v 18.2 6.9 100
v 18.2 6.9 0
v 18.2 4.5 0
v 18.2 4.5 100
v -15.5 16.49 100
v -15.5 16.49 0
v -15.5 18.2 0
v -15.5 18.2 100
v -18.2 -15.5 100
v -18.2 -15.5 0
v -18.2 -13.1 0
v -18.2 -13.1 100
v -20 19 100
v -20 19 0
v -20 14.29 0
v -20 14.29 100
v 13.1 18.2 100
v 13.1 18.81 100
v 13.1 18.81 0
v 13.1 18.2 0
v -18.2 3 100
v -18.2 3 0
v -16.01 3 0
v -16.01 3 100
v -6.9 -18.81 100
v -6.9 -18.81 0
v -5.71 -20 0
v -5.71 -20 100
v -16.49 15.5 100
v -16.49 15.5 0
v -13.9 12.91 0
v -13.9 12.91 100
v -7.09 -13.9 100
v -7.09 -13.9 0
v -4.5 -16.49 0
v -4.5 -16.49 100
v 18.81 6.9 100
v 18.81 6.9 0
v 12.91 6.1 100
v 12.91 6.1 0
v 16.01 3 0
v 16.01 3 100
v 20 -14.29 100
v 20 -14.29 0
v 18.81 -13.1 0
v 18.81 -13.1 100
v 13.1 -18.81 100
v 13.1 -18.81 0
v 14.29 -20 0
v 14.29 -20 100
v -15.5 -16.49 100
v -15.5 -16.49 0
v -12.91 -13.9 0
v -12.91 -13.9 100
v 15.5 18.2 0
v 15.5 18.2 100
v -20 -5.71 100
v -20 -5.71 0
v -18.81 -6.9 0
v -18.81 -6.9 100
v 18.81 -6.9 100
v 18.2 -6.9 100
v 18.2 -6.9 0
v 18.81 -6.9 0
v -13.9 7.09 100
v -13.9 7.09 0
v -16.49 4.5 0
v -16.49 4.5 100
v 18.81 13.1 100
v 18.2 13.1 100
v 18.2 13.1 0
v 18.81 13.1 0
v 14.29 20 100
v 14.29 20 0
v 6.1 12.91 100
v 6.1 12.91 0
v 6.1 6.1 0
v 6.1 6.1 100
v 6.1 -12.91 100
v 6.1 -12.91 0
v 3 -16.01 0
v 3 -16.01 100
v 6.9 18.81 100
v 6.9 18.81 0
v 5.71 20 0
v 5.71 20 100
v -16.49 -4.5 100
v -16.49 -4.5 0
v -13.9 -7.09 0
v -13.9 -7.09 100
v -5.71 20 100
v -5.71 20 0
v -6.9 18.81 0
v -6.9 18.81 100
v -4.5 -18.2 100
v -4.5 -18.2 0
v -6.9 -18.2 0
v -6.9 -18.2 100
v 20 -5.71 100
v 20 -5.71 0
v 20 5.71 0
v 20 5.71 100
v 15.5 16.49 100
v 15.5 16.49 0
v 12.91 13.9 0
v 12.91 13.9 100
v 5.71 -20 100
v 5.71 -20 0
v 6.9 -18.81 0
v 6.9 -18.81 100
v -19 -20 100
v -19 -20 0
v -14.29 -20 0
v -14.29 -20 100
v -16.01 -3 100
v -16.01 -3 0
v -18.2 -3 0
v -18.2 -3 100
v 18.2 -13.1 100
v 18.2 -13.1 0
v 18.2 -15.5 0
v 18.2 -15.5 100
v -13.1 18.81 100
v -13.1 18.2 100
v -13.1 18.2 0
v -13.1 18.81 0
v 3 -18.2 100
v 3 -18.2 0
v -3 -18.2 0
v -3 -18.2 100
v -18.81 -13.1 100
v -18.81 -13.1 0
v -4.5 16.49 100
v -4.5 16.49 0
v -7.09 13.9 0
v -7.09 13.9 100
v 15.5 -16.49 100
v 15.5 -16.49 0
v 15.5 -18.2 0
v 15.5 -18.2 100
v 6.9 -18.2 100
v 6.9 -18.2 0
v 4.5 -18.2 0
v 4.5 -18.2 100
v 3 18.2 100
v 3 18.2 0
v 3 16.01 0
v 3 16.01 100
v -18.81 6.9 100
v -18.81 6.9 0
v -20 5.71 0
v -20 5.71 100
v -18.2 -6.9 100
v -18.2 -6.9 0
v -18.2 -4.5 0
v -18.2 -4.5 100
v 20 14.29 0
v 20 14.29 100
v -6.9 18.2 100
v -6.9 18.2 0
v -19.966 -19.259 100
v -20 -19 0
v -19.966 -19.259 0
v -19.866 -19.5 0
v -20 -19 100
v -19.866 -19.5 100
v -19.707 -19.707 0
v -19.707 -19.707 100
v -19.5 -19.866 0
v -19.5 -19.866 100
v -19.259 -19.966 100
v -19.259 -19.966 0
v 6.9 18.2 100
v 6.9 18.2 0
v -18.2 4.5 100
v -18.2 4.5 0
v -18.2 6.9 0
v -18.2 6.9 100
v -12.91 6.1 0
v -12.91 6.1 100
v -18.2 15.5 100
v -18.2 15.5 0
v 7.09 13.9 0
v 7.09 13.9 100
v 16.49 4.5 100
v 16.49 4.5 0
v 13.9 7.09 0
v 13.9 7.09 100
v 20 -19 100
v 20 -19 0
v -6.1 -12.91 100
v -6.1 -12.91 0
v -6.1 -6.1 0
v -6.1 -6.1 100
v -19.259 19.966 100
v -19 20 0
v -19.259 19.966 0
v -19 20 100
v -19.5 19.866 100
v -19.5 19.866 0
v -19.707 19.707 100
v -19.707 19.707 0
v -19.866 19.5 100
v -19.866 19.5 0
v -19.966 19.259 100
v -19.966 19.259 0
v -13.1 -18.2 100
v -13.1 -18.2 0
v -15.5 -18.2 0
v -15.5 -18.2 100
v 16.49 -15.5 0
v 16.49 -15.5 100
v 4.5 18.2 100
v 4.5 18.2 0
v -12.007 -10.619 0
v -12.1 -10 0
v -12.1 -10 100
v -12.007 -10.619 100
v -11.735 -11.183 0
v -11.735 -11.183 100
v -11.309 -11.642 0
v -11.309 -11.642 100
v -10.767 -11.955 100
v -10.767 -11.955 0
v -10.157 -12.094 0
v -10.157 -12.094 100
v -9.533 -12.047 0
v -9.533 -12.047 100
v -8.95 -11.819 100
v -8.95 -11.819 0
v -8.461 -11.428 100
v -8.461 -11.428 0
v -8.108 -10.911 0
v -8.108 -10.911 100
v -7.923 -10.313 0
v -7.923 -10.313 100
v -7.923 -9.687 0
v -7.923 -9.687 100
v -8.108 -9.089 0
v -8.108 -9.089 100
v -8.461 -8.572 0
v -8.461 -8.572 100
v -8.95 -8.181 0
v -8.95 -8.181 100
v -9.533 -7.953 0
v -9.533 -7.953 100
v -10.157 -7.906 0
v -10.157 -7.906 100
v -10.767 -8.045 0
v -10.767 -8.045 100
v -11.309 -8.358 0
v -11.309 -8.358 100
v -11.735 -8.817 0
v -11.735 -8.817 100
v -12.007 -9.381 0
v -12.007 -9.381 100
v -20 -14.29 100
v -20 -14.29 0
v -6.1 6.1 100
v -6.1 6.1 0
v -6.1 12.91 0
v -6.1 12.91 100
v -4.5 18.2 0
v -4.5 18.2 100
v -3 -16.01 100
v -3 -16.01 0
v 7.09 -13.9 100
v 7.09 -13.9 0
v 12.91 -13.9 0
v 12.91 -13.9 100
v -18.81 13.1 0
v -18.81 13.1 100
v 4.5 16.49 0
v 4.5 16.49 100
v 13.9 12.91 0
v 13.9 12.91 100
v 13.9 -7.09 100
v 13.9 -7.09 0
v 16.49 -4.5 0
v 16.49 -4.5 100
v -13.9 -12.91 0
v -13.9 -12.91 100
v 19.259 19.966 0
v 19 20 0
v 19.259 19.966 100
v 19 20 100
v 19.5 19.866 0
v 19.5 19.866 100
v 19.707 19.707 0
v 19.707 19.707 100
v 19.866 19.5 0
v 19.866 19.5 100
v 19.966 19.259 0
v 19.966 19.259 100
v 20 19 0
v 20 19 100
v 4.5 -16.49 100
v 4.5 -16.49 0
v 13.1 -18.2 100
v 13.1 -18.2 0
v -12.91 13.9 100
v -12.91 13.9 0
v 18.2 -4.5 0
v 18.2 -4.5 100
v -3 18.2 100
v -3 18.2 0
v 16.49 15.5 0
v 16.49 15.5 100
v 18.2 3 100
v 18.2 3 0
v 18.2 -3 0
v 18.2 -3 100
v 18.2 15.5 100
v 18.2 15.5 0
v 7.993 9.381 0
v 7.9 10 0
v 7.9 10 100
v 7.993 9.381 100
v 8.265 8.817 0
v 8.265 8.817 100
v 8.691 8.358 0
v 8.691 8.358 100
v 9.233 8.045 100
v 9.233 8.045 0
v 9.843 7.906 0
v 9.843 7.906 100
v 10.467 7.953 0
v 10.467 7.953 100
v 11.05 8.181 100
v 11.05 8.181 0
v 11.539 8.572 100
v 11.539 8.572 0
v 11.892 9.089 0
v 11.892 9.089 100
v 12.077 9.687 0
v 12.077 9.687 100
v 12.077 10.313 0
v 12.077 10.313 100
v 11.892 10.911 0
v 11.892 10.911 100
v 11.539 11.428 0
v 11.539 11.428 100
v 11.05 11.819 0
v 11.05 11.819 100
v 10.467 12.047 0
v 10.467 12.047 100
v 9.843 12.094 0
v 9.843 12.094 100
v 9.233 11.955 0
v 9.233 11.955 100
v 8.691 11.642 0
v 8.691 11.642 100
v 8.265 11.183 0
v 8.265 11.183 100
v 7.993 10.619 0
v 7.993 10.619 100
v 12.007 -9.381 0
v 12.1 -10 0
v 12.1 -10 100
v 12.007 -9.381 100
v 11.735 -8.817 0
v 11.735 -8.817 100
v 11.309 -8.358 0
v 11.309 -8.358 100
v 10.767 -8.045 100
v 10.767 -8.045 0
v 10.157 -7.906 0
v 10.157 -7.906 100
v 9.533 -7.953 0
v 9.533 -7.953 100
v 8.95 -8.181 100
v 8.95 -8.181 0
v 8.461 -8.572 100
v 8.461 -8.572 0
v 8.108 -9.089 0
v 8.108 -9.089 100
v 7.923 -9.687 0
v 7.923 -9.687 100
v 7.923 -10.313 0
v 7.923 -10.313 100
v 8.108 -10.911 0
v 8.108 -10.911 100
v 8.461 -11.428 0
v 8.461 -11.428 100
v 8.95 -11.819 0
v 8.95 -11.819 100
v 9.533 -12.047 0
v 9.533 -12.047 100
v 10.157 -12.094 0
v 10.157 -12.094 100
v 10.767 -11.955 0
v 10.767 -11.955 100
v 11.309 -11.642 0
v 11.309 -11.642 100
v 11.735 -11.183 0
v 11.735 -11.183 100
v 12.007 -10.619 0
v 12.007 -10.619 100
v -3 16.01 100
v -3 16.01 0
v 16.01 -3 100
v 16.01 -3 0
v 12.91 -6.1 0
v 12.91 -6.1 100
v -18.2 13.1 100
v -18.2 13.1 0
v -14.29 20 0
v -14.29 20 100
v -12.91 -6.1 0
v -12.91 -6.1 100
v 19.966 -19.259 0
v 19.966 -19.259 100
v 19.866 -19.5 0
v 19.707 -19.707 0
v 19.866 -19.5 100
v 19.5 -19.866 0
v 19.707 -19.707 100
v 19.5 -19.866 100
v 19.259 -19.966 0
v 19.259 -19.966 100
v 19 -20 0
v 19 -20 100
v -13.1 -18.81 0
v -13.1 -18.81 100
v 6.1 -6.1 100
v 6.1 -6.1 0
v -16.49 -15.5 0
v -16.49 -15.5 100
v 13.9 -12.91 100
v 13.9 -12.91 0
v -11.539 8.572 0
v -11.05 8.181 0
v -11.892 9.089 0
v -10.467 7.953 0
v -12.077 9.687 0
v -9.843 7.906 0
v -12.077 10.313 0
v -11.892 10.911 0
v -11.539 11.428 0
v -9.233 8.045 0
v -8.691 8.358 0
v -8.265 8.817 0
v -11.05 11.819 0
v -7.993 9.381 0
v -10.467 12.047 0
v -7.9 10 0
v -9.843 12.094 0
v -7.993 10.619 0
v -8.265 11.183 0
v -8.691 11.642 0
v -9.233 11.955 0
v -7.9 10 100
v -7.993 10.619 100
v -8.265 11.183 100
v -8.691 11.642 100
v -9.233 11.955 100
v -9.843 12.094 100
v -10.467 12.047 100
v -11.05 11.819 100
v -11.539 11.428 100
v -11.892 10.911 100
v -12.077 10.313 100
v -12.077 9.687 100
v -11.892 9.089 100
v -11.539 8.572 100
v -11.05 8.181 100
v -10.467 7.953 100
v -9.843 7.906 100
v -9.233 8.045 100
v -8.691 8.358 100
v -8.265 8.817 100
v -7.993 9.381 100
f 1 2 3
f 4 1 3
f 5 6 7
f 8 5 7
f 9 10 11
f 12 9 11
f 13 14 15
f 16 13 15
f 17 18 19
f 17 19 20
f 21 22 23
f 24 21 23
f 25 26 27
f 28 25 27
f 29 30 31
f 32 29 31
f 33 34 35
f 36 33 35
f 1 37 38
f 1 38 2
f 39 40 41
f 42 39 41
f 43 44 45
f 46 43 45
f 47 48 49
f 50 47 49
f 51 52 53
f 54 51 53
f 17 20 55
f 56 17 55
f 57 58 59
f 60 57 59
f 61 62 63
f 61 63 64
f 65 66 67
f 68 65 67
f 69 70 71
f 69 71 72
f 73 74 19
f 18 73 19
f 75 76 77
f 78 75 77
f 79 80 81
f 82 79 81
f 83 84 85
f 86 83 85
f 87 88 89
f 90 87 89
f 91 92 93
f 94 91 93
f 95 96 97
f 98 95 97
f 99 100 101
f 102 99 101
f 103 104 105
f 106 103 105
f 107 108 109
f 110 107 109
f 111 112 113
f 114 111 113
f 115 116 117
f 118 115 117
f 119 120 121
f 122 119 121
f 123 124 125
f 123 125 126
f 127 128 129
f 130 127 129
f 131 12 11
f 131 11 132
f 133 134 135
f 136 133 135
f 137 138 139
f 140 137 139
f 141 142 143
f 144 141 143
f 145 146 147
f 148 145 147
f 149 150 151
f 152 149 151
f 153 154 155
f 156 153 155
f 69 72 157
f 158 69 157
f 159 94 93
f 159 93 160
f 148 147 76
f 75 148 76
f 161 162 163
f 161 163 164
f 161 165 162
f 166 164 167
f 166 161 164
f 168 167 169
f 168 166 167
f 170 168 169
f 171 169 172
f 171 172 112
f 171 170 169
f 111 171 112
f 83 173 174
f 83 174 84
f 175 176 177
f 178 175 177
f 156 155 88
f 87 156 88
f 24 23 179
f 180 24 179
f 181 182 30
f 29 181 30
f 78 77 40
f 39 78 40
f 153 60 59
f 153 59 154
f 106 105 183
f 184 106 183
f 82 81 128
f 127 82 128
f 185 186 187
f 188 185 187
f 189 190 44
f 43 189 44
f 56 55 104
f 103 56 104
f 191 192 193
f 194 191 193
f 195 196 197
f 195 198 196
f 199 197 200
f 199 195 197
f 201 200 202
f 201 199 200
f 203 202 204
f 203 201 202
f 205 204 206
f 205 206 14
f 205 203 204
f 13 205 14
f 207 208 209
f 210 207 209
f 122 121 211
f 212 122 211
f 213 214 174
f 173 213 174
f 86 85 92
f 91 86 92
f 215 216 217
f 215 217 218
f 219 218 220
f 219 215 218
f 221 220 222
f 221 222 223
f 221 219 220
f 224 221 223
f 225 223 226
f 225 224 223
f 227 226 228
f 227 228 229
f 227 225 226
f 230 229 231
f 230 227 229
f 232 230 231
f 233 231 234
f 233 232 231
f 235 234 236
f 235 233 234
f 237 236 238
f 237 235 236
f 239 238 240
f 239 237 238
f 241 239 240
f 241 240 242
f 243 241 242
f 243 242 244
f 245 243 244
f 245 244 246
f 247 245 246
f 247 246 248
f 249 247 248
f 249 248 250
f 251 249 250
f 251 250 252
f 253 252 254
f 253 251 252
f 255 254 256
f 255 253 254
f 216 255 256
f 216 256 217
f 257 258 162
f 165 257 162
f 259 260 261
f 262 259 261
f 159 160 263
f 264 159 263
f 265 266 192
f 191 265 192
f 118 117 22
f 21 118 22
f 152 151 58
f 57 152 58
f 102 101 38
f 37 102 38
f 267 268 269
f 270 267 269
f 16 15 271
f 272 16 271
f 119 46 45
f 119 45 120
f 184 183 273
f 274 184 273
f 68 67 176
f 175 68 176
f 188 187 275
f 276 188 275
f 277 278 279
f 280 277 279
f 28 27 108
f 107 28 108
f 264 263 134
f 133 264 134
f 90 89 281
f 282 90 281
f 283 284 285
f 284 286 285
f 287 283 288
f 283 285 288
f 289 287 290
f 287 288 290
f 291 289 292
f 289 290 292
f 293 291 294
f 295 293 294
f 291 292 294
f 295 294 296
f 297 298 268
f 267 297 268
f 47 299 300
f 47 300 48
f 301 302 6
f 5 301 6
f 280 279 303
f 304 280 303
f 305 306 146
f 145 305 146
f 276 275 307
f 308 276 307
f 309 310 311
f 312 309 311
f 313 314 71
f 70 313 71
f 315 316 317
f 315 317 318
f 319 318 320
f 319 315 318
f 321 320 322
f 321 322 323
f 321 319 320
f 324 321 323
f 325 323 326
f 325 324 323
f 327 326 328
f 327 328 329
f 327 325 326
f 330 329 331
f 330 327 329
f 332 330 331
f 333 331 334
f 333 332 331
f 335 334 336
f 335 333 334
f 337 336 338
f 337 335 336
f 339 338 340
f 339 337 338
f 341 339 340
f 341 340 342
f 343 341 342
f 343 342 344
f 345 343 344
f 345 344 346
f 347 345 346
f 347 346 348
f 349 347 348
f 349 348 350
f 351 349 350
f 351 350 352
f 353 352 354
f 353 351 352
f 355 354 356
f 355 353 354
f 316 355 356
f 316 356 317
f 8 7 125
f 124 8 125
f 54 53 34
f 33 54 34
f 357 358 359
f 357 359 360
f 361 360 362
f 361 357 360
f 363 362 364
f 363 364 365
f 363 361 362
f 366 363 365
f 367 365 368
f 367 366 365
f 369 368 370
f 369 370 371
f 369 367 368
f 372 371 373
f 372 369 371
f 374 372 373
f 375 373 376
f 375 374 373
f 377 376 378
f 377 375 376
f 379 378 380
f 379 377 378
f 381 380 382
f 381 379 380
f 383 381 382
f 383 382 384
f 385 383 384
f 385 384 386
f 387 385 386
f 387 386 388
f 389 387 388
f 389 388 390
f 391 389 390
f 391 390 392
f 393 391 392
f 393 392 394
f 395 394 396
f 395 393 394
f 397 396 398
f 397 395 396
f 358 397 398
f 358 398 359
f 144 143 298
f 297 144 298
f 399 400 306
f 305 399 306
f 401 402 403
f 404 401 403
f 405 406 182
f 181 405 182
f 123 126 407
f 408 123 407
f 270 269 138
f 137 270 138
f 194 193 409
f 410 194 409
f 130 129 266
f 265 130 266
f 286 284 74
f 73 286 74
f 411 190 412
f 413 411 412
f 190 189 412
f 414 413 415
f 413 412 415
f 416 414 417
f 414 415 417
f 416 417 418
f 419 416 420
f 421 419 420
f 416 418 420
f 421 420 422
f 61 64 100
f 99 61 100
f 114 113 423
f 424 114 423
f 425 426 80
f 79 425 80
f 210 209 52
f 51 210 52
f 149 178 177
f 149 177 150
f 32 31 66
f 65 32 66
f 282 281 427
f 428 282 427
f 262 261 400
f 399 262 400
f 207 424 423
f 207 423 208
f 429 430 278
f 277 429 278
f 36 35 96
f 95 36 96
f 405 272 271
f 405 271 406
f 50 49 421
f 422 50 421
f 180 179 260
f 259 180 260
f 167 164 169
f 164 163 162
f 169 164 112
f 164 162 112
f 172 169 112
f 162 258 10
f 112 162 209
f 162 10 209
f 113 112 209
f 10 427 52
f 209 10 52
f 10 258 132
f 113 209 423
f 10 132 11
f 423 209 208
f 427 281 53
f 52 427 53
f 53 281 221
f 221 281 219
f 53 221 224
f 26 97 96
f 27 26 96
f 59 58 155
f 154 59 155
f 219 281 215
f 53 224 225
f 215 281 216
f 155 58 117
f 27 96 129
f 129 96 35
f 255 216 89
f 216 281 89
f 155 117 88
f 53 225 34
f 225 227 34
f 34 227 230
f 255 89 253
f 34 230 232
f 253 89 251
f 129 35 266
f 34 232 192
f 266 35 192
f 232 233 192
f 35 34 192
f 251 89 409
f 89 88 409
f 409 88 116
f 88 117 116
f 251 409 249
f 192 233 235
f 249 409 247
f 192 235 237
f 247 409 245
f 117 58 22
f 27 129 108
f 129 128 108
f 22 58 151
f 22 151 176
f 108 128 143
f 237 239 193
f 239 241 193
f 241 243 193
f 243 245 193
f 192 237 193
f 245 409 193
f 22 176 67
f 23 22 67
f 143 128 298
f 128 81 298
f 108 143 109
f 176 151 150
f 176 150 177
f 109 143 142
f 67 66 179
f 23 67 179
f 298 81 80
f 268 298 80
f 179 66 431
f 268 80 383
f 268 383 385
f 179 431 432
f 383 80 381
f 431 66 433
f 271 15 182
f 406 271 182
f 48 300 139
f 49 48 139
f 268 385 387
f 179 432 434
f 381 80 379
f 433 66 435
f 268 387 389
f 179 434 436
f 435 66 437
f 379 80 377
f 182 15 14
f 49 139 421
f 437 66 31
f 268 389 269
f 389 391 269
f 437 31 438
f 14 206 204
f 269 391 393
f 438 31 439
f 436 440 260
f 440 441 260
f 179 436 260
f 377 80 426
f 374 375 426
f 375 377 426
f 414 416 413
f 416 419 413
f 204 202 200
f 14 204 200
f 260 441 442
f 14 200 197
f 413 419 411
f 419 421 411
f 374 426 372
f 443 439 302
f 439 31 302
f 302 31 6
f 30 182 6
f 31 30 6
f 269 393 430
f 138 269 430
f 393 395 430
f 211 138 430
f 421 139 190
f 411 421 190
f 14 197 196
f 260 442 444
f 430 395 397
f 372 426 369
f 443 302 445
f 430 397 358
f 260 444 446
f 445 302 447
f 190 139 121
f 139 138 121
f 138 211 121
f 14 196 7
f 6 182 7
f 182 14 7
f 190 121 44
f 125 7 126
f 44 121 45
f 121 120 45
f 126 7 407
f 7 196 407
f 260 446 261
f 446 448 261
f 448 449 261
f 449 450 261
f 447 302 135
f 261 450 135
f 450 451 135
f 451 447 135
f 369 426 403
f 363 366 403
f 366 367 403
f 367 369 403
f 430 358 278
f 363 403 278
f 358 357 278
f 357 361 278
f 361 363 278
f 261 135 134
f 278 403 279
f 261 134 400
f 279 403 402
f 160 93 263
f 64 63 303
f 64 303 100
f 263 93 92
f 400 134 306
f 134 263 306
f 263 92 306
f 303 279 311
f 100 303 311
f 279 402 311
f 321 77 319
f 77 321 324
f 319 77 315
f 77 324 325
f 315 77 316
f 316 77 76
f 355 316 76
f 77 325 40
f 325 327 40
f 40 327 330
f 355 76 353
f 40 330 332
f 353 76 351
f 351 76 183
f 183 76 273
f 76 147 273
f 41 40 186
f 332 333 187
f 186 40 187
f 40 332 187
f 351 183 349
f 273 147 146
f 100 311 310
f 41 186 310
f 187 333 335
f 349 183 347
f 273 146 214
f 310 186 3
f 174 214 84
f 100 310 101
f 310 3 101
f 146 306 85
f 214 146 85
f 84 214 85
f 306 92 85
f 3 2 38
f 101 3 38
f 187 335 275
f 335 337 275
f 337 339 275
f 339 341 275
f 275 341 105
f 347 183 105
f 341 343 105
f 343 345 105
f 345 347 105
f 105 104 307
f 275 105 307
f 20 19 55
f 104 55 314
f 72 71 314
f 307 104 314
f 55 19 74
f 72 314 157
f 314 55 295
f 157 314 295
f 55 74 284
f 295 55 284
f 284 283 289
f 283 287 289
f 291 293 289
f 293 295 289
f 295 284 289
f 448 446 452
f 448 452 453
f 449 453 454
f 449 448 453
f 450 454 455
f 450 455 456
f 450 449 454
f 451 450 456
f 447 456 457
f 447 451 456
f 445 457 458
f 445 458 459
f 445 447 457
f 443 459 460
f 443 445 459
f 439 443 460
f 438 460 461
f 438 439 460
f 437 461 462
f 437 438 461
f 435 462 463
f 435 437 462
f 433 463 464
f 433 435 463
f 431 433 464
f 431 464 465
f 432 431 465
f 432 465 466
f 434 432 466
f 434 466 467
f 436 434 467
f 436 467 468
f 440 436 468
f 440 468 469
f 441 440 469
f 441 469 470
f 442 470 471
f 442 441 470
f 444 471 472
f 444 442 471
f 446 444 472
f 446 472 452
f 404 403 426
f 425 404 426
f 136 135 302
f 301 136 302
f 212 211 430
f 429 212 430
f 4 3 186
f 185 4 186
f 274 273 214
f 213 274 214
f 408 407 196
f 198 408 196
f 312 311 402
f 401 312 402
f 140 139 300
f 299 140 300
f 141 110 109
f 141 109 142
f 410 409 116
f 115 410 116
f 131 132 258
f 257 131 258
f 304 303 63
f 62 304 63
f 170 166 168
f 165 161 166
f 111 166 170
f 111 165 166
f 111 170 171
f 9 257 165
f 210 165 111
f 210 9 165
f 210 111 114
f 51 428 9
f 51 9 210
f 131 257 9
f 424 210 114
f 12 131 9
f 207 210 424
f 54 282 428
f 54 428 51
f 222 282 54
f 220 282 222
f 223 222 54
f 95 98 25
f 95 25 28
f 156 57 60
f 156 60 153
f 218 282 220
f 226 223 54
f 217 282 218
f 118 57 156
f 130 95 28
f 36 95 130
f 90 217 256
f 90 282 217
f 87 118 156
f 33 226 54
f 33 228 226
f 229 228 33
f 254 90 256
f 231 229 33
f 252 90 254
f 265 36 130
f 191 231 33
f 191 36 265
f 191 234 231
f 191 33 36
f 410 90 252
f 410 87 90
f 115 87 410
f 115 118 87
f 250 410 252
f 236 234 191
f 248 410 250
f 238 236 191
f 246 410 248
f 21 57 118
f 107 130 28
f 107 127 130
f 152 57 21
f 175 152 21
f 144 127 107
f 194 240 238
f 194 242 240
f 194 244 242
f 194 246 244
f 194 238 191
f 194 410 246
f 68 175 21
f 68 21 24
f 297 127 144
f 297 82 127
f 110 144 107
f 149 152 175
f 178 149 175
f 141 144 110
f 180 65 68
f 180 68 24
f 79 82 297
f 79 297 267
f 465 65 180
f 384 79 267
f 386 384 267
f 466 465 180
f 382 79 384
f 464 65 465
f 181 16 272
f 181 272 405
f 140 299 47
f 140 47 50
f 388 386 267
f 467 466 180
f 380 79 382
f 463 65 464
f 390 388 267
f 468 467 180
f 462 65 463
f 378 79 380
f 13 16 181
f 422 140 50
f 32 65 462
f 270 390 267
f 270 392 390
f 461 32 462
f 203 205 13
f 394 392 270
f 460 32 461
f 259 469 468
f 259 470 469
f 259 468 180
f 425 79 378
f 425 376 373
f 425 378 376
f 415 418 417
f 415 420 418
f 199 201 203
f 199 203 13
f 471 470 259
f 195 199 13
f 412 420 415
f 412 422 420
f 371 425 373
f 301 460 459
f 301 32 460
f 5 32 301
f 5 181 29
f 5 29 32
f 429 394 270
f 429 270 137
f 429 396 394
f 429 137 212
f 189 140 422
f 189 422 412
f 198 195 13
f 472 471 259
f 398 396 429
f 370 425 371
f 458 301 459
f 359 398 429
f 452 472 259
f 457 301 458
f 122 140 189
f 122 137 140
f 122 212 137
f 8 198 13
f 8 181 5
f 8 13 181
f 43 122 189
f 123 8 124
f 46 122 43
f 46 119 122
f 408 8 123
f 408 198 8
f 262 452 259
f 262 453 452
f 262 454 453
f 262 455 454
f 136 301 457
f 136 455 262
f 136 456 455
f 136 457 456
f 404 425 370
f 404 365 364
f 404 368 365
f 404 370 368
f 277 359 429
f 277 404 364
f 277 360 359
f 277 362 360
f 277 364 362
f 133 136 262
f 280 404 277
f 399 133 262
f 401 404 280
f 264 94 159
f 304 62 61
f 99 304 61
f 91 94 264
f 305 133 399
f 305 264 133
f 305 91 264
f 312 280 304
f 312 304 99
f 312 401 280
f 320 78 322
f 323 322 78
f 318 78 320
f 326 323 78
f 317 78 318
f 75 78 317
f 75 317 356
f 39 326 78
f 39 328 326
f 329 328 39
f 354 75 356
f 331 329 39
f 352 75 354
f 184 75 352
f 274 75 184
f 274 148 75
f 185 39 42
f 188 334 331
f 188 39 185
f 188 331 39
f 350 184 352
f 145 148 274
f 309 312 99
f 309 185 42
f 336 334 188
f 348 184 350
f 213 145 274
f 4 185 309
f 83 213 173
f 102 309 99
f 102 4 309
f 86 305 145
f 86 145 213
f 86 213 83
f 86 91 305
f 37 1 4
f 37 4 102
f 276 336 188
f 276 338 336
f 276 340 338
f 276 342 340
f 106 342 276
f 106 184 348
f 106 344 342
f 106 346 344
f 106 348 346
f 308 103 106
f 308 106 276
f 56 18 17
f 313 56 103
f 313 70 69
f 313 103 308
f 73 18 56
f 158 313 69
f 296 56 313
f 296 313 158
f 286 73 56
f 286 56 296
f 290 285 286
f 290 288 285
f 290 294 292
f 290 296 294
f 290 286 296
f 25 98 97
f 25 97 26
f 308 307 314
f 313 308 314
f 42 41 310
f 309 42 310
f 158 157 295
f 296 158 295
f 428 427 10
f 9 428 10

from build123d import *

# Parameters (mm, degrees)
SKETCH_1_R      = 2.1
EXTRUDE_1_DEPTH = 100
VERRUNDUNG1_R   = 1


with BuildPart() as part:
    # 草图1 → 凸台-拉伸1 (new body)
    with BuildSketch(Plane.XY):
        Polygon((5.71, 20), (-5.71, 20), (-6.9, 18.81), (-6.9, 18.2), (-4.5, 18.2), (-4.5, 16.489949494), (-7.089949494, 13.9), (-12.910050506, 13.9), (-15.5, 16.489949494), (-15.5, 18.2), (-13.1, 18.2), (-13.1, 18.81), (-14.29, 20), (-20, 20), (-20, 14.29), (-18.81, 13.1), (-18.2, 13.1), (-18.2, 15.5), (-16.489949494, 15.5), (-13.9, 12.910050506), (-13.9, 7.089949494), (-16.489949494, 4.5), (-18.2, 4.5), (-18.2, 6.9), (-18.81, 6.9), (-20, 5.71), (-20, -5.71), (-18.81, -6.9), (-18.2, -6.9), (-18.2, -4.5), (-16.489949494, -4.5), (-13.9, -7.089949494), (-13.9, -12.910050506), (-16.489949494, -15.5), (-18.2, -15.5), (-18.2, -13.1), (-18.81, -13.1), (-20, -14.29), (-20, -20), (-14.29, -20), (-13.1, -18.81), (-13.1, -18.2), (-15.5, -18.2), (-15.5, -16.489949494), (-12.910050506, -13.9), (-7.089949494, -13.9), (-4.5, -16.489949494), (-4.5, -18.2), (-6.9, -18.2), (-6.9, -18.81), (-5.71, -20), (5.71, -20), (6.9, -18.81), (6.9, -18.2), (4.5, -18.2), (4.5, -16.489949494), (7.089949494, -13.9), (12.910050506, -13.9), (15.5, -16.489949494), (15.5, -18.2), (13.1, -18.2), (13.1, -18.81), (14.29, -20), (20, -20), (20, -14.29), (18.81, -13.1), (18.2, -13.1), (18.2, -15.5), (16.489949494, -15.5), (13.9, -12.910050506), (13.9, -7.089949494), (16.489949494, -4.5), (18.2, -4.5), (18.2, -6.9), (18.81, -6.9), (20, -5.71), (20, 5.71), (18.81, 6.9), (18.2, 6.9), (18.2, 4.5), (16.489949494, 4.5), (13.9, 7.089949494), (13.9, 12.910050506), (16.489949494, 15.5), (18.2, 15.5), (18.2, 13.1), (18.81, 13.1), (20, 14.29), (20, 20), (14.29, 20), (13.1, 18.81), (13.1, 18.2), (15.5, 18.2), (15.5, 16.489949494), (12.910050506, 13.9), (7.089949494, 13.9), (4.5, 16.489949494), (4.5, 18.2), (6.9, 18.2), (6.9, 18.81), align=None)
        with Locations((-10, 10)):
            Circle(SKETCH_1_R, mode=Mode.SUBTRACT)
        with Locations(Location((-10, -10, 0), (0, 0, 180))):
            Circle(SKETCH_1_R, mode=Mode.SUBTRACT)
        with Locations((10, -10)):
            Circle(SKETCH_1_R, mode=Mode.SUBTRACT)
        with Locations(Location((10, 10, 0), (0, 0, 180))):
            Circle(SKETCH_1_R, mode=Mode.SUBTRACT)
        Polygon((-6.1, 6.1), (-6.1, 12.910050506), (-3, 16.010050506), (-3, 18.2), (3, 18.2), (3, 16.010050506), (6.1, 12.910050506), (6.1, 6.1), (12.910050506, 6.1), (16.010050506, 3), (18.2, 3), (18.2, -3), (16.010050506, -3), (12.910050506, -6.1), (6.1, -6.1), (6.1, -12.910050506), (3, -16.010050506), (3, -18.2), (-3, -18.2), (-3, -16.010050506), (-6.1, -12.910050506), (-6.1, -6.1), (-12.910050506, -6.1), (-16.010050506, -3), (-18.2, -3), (-18.2, 3), (-16.010050506, 3), (-12.910050506, 6.1), align=None, mode=Mode.SUBTRACT)
    extrude(amount=EXTRUDE_1_DEPTH)

    # Verrundung1
    verrundung1_edges = [part.edges().sort_by_distance(p)[0] for p in [
        (20, 20, 50),
        (20, -20, 50),
        (-20, -20, 50),
        (-20, 20, 50),
    ]]
    fillet(verrundung1_edges, radius=VERRUNDUNG1_R)


solid = part.part
